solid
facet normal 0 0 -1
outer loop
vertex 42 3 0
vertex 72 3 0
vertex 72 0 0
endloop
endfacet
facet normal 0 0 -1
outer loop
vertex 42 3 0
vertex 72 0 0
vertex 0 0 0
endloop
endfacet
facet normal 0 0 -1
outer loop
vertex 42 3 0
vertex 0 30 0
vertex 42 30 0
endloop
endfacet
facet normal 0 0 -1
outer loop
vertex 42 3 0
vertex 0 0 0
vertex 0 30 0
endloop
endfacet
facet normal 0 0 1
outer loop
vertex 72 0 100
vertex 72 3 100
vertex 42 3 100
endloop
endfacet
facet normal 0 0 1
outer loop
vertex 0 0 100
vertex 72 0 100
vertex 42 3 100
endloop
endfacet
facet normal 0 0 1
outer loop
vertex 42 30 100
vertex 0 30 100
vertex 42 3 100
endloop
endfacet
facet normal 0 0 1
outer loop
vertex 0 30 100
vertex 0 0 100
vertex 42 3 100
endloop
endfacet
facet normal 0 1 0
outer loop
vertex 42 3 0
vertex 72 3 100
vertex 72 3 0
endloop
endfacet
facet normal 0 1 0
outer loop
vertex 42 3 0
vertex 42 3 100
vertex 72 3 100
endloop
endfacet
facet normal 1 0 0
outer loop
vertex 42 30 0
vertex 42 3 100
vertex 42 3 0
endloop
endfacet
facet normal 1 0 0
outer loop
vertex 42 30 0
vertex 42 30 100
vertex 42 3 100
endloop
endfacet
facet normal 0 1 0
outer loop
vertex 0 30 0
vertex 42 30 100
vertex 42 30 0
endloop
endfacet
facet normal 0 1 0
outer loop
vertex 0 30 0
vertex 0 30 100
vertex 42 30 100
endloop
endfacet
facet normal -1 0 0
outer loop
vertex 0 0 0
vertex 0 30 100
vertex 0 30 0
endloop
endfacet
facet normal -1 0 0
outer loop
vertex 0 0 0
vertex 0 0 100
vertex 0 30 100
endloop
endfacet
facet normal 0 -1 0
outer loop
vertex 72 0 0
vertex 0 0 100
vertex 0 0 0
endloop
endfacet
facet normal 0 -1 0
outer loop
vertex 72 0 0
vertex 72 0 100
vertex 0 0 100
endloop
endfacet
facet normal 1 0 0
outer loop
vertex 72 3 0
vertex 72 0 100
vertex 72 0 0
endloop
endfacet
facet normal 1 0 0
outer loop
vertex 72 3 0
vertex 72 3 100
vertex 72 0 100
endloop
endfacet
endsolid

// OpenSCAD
// file: Parts/Screw.scad
// created by IndiePandaaaaa | Lukas

function cone_diameter(diameter) = diameter * 2;

function cone_height(diameter) = diameter * 0.75;

module screw(diameter, length, cutout_sample = false, fs = 0.1, fa = 1) {
    //$fs = 0.1; [size in mm] | $fa = 1; [degrees]
    //$fn = 100; [defined faces]

    module base_model(diameter, length, cone_height, cone_diameter, offset = 0, fs = 0.1, fa = 1) {
        rotate_extrude($fs = fs) {
            polygon([
                    [0, 0],
                    [(diameter + offset) / 2, 0],
                    [(diameter + offset) / 2, (length + offset) - (cone_height + offset)],
                    [(cone_diameter + offset) / 2, length + offset],
                    [0, length + offset],
                ]);
        }
    }

    if (length < diameter) {
        echo("Screw is too short");
        length = diameter + 1;
        echo("New length is: ", length);
    }

    if (!cutout_sample) {
        translate([0, 0, - length])
            difference() {
                base_model(diameter, length, cone_height(diameter), cone_diameter(diameter));

                // top cross part
                translate([0, 0, length + 0.1 - (cone_height(diameter) - diameter / 2)])
                    difference() {
                        rotate([0, 0, 45])
                            rotate_extrude($fn = 4) {
                                polygon([
                                        [0, 0],
                                        [diameter * 1.4 / 2, 0],
                                        [cone_diameter(diameter) / 2, cone_height(diameter) - diameter / 2],
                                        [0, cone_height(diameter) - diameter / 2],
                                    ]);
                            }
                        for (i = [0 : 1 : 3]) {
                            rotate([0, 0, 90 * i])
                                translate([diameter / 3.18 / 2, diameter / 3.18 / 2, - 0.1])
                                    cube(cone_height(diameter) + 0.2);
                        }
                    }
            }
    } else {
        offset = 0.2;
        translate([0, 0, - length - offset / 2])
            base_model(diameter, length, cone_height(diameter), cone_diameter(diameter), offset);
    }
}

screw(3.5, 12);
// main file
// created by IndiePandaaaaa | Lukas

use <Parts/Screw.scad>

THICKNESS = 3.0;
TOLERANCE = 0.1;
CHAMFER = 1.5;
SCREW_OD = 3.5;
$fn = 75;

HEIGTH = 30; // Proxxon MB200 table
WIDTH = 100;
DEPTH = 42;
MOUNT_DEPTH = 30;

linear_extrude(WIDTH) {
    polygon([
            [0, 0],
            [DEPTH + MOUNT_DEPTH, 0],
            [DEPTH + MOUNT_DEPTH, THICKNESS],
            [DEPTH, THICKNESS],
            [DEPTH, HEIGTH],
            [0, HEIGTH],
        ]);
}
